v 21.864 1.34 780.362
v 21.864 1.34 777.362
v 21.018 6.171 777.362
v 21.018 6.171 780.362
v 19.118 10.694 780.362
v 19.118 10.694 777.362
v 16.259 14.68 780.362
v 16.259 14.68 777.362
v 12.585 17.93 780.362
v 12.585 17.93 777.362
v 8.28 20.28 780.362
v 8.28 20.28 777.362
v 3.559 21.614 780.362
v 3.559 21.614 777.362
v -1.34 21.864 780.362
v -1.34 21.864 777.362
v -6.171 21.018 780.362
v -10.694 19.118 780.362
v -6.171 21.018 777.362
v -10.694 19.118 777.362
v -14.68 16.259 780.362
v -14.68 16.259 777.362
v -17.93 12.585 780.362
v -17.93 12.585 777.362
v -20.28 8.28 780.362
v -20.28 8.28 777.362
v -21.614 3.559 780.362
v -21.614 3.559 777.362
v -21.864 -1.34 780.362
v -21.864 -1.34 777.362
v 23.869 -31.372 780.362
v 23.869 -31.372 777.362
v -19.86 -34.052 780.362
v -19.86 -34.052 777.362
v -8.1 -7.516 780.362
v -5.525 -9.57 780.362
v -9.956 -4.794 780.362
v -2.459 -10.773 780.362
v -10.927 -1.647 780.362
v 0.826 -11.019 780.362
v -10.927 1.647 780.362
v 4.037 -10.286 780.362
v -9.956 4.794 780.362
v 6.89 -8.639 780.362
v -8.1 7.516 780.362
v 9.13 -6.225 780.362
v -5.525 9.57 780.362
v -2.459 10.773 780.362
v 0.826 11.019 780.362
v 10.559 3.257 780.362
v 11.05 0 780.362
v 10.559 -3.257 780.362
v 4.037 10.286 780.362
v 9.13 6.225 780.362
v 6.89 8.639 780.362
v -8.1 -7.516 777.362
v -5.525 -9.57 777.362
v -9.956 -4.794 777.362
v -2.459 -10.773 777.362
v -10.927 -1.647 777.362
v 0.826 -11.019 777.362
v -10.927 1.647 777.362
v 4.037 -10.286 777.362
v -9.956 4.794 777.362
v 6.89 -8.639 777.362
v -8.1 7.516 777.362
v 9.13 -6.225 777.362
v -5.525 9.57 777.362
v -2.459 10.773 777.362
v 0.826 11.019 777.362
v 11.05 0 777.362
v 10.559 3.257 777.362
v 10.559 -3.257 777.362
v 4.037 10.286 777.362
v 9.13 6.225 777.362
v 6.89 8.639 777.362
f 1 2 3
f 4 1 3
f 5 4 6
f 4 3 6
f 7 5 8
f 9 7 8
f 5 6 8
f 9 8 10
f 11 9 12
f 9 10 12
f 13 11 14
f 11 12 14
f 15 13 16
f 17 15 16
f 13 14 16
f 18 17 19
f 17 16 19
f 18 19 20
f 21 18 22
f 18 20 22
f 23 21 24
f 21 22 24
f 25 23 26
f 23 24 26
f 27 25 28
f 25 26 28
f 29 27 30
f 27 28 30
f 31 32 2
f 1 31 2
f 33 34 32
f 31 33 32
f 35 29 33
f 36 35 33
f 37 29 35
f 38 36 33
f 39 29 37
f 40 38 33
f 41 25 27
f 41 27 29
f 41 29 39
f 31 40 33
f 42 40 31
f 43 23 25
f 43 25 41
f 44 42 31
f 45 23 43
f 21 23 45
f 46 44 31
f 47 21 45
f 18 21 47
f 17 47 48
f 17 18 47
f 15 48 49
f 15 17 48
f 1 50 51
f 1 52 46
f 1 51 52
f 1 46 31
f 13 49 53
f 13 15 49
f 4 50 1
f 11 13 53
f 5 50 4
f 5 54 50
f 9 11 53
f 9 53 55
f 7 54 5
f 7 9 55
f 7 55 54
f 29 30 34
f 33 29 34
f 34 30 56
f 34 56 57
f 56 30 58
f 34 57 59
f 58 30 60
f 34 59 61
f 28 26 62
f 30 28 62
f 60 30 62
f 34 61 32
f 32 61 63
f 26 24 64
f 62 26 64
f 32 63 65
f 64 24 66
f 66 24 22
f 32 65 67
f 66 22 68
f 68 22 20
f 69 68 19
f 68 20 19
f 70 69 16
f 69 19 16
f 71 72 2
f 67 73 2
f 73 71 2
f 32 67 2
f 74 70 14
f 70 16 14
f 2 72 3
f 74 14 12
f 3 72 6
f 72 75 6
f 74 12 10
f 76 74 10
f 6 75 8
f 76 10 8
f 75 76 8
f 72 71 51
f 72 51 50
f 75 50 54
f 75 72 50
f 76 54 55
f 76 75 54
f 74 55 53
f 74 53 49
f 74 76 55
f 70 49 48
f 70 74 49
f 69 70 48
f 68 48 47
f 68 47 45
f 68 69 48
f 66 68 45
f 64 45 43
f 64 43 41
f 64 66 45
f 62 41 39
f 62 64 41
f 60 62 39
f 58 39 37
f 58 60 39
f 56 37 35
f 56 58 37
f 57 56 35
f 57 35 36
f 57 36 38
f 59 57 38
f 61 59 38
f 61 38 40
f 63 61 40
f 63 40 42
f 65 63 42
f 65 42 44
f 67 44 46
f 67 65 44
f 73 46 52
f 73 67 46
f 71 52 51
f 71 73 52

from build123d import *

# Parameters (mm, degrees)
SKETCH2_R           = 11.05
BOSS_EXTRUDE1_DEPTH = 3


with BuildPart() as part:
    # Sketch2 → Boss-Extrude1 (new body)
    with BuildSketch(Plane.XY.offset(777.361907162)):
        with BuildLine():
            Line((-21.864371204, -1.339746134), (-19.859932286, -34.051761818))
            Line((-19.859932286, -34.051761818), (23.868810121, -31.37226955))
            Line((23.868810121, -31.37226955), (21.864371204, 1.339746134))
            ThreePointArc((21.864371204, 1.339746134), (-1.339746134, 21.864371204), (-21.864371204, -1.339746134))
        make_face()
        Circle(SKETCH2_R, mode=Mode.SUBTRACT)
    extrude(amount=BOSS_EXTRUDE1_DEPTH)


solid = part.part
